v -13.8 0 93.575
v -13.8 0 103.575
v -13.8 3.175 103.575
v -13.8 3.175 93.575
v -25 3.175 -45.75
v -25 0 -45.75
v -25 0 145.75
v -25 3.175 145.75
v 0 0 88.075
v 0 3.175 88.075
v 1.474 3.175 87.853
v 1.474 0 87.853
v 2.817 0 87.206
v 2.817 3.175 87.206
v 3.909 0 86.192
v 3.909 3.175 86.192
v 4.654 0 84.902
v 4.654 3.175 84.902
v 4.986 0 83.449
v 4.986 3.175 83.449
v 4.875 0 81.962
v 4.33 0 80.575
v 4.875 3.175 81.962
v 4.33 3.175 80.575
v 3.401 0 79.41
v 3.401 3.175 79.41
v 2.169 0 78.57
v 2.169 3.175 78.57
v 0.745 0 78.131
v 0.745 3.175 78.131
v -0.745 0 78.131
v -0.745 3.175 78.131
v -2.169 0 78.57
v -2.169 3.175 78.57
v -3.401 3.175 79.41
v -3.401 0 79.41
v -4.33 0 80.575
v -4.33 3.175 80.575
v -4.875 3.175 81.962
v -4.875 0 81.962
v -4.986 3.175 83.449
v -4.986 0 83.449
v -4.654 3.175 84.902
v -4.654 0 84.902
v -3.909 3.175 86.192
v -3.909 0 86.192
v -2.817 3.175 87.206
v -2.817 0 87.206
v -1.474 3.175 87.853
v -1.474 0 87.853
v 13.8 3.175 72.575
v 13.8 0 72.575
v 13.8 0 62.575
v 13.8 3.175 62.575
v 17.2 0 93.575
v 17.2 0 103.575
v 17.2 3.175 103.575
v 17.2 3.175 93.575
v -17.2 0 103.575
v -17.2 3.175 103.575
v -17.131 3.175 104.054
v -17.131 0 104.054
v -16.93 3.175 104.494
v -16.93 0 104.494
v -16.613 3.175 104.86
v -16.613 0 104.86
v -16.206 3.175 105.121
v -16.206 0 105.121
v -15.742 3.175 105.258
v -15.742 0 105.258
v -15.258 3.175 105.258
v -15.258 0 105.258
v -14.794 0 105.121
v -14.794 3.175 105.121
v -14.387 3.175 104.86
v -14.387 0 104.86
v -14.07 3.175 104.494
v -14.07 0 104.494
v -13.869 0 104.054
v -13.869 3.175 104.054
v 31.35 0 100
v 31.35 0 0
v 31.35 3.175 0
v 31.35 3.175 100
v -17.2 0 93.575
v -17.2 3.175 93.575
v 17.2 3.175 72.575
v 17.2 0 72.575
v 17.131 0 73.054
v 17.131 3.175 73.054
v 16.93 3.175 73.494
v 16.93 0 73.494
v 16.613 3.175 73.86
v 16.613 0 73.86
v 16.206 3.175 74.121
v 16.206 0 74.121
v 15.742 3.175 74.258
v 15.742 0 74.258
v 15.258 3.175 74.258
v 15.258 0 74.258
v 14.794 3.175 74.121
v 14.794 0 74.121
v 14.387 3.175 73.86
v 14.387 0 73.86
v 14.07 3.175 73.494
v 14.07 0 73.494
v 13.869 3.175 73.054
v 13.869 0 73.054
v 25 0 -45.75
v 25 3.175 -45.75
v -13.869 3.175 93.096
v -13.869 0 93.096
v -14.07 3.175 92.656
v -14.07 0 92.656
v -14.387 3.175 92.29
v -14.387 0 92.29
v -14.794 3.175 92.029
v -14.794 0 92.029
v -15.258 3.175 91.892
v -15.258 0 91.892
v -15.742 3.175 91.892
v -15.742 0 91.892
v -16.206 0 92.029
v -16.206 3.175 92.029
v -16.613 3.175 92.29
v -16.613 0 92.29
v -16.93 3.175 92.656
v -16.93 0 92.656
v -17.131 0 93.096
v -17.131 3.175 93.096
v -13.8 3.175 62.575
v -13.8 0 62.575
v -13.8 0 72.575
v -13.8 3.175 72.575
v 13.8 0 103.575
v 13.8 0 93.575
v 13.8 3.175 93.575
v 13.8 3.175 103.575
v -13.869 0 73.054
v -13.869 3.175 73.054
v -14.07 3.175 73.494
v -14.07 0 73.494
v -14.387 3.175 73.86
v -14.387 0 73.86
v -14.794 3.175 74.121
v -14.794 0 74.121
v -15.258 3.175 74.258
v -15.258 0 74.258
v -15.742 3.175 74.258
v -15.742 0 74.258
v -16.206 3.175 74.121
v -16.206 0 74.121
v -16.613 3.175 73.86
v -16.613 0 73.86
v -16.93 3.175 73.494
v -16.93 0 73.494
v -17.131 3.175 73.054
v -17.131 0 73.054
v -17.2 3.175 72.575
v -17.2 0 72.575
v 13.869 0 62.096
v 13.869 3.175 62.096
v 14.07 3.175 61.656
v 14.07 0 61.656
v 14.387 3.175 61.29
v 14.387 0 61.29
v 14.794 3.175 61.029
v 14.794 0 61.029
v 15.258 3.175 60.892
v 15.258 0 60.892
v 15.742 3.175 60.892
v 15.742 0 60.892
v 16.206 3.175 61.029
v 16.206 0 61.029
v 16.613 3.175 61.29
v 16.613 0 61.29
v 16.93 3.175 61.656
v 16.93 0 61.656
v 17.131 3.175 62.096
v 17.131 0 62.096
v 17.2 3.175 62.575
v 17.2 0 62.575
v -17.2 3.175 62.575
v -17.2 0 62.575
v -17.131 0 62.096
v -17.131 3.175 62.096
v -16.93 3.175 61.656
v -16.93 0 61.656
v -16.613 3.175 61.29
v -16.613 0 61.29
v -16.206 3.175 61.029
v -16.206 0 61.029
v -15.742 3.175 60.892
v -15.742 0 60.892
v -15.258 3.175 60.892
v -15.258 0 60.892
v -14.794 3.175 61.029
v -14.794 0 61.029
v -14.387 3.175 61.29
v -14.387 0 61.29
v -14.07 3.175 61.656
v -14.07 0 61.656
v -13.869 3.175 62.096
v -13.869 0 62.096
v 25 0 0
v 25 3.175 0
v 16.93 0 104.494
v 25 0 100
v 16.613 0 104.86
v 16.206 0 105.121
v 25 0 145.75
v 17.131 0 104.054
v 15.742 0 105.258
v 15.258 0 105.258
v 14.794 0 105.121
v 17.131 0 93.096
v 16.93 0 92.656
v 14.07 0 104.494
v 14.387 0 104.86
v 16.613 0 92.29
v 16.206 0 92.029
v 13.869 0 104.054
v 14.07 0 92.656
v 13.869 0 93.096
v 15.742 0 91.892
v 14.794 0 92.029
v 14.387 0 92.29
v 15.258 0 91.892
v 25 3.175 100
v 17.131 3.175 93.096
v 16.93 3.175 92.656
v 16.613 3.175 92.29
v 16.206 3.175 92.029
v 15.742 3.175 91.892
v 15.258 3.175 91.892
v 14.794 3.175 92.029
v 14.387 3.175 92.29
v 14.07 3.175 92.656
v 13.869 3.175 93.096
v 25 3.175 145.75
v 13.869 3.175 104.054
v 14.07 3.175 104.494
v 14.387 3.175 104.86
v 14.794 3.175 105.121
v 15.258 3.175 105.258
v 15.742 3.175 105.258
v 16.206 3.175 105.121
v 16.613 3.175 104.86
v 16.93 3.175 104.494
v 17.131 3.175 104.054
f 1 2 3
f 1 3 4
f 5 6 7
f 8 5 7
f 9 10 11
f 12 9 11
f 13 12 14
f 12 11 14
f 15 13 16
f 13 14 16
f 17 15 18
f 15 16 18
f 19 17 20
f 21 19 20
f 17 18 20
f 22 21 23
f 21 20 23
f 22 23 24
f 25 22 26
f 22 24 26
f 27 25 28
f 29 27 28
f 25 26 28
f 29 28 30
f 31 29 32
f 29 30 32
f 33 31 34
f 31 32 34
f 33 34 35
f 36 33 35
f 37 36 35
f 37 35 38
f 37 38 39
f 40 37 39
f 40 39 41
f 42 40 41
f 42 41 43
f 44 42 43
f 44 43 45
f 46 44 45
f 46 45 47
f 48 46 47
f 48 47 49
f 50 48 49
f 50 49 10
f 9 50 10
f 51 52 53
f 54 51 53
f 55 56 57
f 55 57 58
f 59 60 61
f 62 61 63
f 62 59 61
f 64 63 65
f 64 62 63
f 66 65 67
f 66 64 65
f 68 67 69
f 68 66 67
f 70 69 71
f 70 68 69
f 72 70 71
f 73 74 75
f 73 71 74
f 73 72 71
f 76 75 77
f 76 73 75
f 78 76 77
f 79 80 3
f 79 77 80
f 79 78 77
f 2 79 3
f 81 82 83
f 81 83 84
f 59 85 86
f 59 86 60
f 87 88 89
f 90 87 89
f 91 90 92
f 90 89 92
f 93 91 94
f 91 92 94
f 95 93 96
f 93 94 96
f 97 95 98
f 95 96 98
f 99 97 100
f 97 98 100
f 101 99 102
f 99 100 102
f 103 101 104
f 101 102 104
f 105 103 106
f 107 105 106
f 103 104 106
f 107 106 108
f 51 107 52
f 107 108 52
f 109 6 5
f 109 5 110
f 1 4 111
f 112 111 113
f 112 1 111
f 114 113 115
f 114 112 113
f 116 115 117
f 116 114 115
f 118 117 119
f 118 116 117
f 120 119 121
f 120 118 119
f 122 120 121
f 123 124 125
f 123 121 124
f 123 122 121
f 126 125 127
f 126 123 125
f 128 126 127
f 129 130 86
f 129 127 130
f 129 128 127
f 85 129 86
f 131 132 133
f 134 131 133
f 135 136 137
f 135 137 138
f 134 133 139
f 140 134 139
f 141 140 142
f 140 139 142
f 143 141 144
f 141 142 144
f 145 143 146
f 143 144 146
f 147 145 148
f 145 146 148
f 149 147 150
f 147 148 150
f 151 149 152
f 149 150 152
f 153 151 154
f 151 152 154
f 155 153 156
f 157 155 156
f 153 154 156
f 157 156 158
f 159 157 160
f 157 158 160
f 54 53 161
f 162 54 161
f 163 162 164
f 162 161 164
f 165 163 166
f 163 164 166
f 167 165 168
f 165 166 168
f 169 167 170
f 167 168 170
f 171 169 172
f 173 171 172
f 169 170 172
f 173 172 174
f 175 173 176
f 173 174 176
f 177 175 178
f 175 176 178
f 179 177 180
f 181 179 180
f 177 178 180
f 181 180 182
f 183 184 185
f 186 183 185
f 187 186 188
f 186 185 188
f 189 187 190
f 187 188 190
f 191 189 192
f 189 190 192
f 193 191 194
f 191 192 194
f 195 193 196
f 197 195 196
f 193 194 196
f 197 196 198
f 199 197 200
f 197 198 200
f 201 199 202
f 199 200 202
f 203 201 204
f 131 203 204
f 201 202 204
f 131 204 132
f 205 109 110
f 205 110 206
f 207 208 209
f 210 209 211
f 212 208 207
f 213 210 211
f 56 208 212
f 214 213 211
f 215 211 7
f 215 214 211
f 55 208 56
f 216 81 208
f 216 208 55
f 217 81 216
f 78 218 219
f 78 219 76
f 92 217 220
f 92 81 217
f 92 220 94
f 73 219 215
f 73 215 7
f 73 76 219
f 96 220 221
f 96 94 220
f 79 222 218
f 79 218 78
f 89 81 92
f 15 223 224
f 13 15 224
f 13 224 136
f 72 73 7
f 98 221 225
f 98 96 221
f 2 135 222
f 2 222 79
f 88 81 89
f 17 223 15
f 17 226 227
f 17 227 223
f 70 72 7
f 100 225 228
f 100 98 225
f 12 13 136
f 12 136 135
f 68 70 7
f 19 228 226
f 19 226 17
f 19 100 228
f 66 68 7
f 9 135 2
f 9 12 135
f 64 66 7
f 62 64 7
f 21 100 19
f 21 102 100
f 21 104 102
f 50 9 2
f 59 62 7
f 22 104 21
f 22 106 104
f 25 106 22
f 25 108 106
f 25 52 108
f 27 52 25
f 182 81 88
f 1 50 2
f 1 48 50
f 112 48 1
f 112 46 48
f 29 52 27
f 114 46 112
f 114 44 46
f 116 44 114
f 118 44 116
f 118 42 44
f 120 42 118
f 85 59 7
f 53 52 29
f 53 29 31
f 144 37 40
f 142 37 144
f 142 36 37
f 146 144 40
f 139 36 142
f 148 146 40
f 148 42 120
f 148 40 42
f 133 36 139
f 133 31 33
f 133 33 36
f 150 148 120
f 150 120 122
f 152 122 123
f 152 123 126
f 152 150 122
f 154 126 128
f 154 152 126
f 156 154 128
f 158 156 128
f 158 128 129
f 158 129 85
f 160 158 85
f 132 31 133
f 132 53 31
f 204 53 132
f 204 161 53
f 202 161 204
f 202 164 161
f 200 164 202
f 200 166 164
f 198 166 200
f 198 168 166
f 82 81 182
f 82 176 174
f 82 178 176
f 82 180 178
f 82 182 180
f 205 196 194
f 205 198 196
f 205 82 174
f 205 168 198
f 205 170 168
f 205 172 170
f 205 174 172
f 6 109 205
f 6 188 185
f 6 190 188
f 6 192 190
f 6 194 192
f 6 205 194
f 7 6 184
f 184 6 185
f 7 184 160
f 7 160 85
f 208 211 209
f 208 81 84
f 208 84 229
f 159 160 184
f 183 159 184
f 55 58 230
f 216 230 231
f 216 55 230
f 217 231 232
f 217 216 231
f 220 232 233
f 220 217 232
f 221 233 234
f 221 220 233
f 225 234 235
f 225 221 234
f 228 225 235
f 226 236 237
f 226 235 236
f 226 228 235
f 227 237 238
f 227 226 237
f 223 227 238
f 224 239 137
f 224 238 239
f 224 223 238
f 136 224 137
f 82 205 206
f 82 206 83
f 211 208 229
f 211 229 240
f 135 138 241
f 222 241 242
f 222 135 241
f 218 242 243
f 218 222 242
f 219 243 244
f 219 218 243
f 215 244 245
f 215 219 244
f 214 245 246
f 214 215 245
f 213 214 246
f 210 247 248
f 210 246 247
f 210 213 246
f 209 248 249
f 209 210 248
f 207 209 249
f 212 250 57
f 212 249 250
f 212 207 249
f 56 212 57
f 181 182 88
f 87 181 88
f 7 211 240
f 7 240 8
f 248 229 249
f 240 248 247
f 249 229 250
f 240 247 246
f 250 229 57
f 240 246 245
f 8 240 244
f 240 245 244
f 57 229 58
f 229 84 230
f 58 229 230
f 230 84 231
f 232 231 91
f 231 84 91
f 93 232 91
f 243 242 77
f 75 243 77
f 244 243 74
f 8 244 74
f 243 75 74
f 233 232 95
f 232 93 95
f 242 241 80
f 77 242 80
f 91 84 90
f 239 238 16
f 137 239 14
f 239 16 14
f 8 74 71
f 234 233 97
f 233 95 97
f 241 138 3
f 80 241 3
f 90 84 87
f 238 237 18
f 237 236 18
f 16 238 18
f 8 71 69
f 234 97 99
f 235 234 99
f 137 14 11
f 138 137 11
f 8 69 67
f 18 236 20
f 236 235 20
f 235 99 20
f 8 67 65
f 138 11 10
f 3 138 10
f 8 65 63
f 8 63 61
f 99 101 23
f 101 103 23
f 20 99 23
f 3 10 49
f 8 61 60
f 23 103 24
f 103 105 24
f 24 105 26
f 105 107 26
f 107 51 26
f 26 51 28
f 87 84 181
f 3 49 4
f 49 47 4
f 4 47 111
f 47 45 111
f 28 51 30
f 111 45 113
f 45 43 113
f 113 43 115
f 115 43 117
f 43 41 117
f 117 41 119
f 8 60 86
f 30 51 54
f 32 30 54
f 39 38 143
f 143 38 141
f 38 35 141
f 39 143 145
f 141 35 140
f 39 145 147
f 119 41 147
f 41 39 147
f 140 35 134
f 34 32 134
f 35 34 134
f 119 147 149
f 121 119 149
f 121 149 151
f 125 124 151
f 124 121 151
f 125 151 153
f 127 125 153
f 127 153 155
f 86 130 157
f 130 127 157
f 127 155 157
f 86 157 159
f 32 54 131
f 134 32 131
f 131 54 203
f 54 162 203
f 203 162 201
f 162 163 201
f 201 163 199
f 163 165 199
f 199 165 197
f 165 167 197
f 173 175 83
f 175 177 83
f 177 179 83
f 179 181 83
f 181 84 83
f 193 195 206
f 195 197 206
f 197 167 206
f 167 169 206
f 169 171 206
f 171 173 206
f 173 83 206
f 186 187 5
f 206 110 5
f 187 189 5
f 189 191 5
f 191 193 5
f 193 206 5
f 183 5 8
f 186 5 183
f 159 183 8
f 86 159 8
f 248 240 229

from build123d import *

# Parameters (mm, degrees)
BOSS_EXTRUDE1_DEPTH  = 3.175
SKETCH3_R            = 5
CUT_EXTRUDE1_DEPTH   = 150.117288149
M3_CLEARANCE_HOLE1_D = 3.4
CUT_EXTRUDE2_DEPTH   = 150.117288149


with BuildPart() as part:
    # Sketch1 → Boss-Extrude1 (new body)
    with BuildSketch(Plane(origin=(0, 0, 0), x_dir=(1, 0, 0), z_dir=(0, 1, 0))):
        Polygon((-25, 0), (-25, 45.75), (25, 45.75), (25, 0), (31.35, 0), (31.35, -100), (25, -100), (25, -145.75), (-25, -145.75), (-25, -100), align=None)
    extrude(amount=BOSS_EXTRUDE1_DEPTH)

    # Sketch3 → Cut-Extrude1 (cut, through all)
    with BuildSketch(Plane(origin=(0, 3.175, 0), x_dir=(1, 0, 0), z_dir=(0, 1, 0))):
        with Locations(Location((0, -83.075, 0), (0, 0, 270))):
            Circle(SKETCH3_R)
    extrude(amount=-CUT_EXTRUDE1_DEPTH, mode=Mode.SUBTRACT)

    # M3 Clearance Hole1 (through all)
    with Locations(Plane(origin=(0, 3.175, 0), x_dir=(1, 0, 0), z_dir=(0, 1, 0))):
        with Locations((15.5, -98.575), (-15.5, -98.575), (-15.5, -67.575), (15.5, -67.575)):
            Hole(M3_CLEARANCE_HOLE1_D / 2)

    # Sketch6 → Cut-Extrude2 (cut, through all)
    with BuildSketch(Plane.XZ):
        with BuildLine():
            Line((17.2, 103.575), (17.2, 93.575))
            ThreePointArc((17.2, 93.575), (15.5, 91.875), (13.8, 93.575))
            Line((13.8, 93.575), (13.8, 103.575))
            ThreePointArc((13.8, 103.575), (15.5, 105.275), (17.2, 103.575))
        make_face()
        with BuildLine():
            Line((-13.8, 103.575), (-13.8, 93.575))
            ThreePointArc((-13.8, 93.575), (-15.5, 91.875), (-17.2, 93.575))
            Line((-17.2, 93.575), (-17.2, 103.575))
            ThreePointArc((-17.2, 103.575), (-15.5, 105.275), (-13.8, 103.575))
        make_face()
        with BuildLine():
            Line((17.2, 62.575), (17.2, 72.575))
            ThreePointArc((17.2, 72.575), (15.5, 74.275), (13.8, 72.575))
            Line((13.8, 72.575), (13.8, 62.575))
            ThreePointArc((13.8, 62.575), (15.5, 60.875), (17.2, 62.575))
        make_face()
        with BuildLine():
            Line((-13.8, 62.575), (-13.8, 72.575))
            ThreePointArc((-13.8, 72.575), (-15.5, 74.275), (-17.2, 72.575))
            Line((-17.2, 72.575), (-17.2, 62.575))
            ThreePointArc((-17.2, 62.575), (-15.5, 60.875), (-13.8, 62.575))
        make_face()
    extrude(amount=-CUT_EXTRUDE2_DEPTH, mode=Mode.SUBTRACT)


solid = part.part
